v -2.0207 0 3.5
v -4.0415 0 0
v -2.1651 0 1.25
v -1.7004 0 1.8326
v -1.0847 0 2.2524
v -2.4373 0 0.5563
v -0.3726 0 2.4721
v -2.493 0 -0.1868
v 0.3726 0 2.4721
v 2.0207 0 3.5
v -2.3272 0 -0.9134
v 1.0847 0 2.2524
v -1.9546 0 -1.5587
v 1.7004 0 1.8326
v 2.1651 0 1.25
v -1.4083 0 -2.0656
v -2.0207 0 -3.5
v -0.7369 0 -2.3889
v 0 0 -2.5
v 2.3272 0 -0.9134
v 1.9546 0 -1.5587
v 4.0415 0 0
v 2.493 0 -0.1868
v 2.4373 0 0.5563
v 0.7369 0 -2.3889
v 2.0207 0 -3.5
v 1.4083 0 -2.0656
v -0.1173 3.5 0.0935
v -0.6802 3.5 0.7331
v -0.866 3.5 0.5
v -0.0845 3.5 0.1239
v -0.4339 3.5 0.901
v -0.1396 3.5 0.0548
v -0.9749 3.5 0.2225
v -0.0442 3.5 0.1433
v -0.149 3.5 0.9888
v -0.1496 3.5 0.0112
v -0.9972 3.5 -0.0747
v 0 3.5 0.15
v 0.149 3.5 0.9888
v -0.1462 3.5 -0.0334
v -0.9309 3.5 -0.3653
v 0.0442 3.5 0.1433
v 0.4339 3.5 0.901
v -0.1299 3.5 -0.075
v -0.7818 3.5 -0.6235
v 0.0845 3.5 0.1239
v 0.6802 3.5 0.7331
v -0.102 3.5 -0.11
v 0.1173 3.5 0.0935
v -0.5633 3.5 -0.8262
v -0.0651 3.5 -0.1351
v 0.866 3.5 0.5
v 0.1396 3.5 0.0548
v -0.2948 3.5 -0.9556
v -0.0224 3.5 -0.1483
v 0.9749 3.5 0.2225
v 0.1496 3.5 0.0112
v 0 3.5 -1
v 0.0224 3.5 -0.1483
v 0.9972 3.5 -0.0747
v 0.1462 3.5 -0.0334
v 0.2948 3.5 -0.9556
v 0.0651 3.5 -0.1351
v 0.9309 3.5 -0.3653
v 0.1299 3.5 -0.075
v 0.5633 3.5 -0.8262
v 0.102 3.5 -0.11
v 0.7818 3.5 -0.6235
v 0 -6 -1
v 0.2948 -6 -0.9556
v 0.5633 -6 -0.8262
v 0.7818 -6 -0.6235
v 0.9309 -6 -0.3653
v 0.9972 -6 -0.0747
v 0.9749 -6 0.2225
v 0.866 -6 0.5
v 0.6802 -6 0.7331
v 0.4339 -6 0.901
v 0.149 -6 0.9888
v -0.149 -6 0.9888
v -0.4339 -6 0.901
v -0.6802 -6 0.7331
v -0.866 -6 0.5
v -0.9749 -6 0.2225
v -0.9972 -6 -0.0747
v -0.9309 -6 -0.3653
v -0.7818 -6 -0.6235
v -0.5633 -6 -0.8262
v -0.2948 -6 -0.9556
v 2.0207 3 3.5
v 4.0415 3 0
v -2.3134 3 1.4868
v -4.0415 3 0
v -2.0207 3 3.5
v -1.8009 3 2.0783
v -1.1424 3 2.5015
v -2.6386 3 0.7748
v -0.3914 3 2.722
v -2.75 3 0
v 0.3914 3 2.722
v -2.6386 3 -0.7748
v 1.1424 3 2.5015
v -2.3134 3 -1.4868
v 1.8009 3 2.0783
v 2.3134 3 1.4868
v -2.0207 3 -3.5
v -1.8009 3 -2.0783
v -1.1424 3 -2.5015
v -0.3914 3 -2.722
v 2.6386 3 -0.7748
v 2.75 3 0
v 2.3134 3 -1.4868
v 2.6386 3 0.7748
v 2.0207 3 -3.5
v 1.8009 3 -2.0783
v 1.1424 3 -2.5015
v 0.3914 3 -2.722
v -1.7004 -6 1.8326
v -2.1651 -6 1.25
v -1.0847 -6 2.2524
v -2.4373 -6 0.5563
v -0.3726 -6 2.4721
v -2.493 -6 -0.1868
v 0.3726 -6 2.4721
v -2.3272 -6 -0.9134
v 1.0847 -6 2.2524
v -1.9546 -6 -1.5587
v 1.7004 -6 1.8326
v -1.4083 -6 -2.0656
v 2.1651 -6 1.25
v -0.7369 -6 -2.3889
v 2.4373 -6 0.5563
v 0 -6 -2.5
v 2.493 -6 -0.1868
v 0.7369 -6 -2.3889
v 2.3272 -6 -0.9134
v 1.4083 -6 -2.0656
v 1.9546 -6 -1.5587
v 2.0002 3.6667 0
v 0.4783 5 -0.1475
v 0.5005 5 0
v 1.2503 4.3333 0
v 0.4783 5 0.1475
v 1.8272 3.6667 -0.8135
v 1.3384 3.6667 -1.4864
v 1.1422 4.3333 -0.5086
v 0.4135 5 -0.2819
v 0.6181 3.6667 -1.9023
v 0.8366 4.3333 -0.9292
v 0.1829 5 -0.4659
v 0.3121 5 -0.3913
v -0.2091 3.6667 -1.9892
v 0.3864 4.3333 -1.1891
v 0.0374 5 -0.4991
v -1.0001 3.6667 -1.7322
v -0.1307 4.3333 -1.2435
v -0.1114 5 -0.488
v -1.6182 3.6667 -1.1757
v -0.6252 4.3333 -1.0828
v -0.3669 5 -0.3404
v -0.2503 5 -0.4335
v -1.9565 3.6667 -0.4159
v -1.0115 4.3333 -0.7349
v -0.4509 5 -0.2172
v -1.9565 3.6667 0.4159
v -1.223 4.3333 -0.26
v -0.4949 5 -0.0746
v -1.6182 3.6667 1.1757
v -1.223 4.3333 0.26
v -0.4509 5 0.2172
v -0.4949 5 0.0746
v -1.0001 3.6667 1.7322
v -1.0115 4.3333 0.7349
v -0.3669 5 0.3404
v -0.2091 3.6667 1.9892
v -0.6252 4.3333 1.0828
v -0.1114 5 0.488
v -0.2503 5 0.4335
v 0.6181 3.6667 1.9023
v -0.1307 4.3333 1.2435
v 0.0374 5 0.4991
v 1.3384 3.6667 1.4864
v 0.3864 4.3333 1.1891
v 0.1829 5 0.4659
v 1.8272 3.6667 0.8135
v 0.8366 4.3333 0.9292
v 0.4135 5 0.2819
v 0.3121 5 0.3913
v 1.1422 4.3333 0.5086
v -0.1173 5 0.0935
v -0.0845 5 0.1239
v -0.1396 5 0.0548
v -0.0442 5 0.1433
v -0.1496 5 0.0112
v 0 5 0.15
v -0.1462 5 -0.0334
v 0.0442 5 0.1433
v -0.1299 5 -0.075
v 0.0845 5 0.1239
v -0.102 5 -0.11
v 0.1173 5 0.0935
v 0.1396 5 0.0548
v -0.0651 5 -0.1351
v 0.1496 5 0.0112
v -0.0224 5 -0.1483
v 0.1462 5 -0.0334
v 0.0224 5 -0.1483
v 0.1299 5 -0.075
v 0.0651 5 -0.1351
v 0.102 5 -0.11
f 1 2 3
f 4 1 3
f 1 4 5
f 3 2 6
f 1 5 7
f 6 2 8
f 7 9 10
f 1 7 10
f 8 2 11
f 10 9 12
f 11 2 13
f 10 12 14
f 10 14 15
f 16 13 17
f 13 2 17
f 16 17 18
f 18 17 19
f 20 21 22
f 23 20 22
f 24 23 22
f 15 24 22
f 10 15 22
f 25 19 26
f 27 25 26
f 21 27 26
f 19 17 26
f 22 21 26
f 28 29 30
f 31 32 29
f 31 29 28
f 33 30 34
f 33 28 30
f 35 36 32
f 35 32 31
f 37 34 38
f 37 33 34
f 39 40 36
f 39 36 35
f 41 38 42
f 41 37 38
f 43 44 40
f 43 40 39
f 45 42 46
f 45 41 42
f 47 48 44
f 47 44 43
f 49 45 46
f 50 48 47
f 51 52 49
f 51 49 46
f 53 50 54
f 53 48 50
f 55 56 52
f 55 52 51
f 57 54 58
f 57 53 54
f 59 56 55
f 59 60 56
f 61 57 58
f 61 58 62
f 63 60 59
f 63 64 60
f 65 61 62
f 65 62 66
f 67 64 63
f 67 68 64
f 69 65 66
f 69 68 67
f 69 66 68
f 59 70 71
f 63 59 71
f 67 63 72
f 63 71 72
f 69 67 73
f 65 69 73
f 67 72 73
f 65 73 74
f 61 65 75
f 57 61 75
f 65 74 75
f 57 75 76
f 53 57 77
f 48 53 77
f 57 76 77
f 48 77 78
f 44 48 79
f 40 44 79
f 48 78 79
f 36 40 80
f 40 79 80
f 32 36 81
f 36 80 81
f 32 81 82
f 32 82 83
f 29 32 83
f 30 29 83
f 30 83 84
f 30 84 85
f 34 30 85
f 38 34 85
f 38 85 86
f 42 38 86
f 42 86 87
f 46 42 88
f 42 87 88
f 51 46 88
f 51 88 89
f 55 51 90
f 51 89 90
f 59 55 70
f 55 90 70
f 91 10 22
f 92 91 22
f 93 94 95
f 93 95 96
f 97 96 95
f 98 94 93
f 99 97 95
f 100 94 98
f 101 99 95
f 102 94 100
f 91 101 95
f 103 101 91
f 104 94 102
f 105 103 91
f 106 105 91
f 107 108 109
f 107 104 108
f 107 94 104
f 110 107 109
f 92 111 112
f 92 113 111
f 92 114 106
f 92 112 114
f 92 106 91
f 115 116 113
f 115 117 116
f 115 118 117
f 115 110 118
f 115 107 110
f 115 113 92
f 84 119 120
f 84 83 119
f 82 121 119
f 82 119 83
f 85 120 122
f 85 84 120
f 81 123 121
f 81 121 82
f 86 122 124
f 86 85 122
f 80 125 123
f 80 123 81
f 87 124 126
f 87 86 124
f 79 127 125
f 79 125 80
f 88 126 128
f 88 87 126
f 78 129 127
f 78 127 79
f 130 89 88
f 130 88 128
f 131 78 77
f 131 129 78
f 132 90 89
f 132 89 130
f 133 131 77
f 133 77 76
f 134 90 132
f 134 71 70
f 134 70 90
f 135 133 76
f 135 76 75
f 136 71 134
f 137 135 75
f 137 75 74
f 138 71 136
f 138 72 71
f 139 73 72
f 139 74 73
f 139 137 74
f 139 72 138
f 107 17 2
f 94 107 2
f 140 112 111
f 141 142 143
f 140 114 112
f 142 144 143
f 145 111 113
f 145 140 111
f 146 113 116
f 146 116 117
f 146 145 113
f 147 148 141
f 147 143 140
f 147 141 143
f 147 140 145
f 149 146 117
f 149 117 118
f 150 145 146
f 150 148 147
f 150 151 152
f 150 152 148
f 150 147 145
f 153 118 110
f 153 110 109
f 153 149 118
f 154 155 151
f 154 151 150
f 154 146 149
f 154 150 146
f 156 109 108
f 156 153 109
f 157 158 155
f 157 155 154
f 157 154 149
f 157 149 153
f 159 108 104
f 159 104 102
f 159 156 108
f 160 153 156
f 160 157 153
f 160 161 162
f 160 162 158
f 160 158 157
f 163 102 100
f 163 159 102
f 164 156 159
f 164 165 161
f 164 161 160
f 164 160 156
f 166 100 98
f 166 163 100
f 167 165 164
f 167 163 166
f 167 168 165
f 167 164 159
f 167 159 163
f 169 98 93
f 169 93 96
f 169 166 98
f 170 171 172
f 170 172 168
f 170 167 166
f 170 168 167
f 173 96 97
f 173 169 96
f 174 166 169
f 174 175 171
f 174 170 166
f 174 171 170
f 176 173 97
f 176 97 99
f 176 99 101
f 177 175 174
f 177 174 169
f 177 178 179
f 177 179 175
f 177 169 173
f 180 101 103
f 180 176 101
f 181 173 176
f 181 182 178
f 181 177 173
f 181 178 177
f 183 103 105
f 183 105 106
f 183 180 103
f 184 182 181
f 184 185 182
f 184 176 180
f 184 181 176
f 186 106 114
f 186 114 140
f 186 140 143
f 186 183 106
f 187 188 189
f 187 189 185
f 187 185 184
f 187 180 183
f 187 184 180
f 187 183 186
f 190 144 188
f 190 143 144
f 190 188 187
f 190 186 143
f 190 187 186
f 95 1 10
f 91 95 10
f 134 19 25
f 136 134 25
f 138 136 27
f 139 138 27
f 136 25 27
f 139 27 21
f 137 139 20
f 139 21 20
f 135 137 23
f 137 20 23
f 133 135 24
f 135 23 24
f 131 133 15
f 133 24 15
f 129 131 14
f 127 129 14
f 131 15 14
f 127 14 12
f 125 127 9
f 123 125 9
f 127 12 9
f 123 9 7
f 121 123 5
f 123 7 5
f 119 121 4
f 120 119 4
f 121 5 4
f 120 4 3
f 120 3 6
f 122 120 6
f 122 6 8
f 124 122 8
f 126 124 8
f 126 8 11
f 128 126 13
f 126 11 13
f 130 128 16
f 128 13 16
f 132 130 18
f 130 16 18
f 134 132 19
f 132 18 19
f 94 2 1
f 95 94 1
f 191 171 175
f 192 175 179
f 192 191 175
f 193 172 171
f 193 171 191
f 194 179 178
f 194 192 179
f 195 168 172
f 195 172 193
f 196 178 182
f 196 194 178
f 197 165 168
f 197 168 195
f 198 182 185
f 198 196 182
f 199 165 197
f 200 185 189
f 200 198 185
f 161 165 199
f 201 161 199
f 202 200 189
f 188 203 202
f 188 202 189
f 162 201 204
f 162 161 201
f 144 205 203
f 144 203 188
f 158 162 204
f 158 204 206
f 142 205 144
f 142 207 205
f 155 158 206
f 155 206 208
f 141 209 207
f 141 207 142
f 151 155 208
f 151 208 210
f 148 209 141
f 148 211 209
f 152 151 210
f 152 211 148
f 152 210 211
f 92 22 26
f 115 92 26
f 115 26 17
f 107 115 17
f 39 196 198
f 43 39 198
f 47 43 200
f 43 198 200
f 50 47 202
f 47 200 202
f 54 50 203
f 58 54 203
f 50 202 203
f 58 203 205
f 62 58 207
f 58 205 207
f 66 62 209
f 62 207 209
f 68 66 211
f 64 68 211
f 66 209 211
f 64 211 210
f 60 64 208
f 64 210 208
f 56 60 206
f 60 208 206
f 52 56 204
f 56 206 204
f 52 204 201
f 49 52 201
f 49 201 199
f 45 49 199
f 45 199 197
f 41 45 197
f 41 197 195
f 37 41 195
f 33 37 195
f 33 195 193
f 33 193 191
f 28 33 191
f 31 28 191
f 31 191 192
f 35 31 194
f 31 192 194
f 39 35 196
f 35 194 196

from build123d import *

# Parameters (mm, degrees)
BOSS_EXTRUDE1_DEPTH = 3
SKETCH2_R           = 2.75
BOSS_EXTRUDE2_DEPTH = 2
BOSS_EXTRUDE2_TAPER = 48.36
SKETCH4_R           = 0.15
CUT_EXTRUDE1_DEPTH  = 1.5
SKETCH6_R           = 2.5
BOSS_EXTRUDE3_DEPTH = 6
SKETCH7_R           = 1
CUT_EXTRUDE3_DEPTH  = 9.5


with BuildPart() as part:
    # Sketch1 → Boss-Extrude1 (new body)
    with BuildSketch(Plane(origin=(0, 0, 0), x_dir=(1, 0, 0), z_dir=(0, 1, 0))):
        Polygon((4.041451884, 0), (2.020725942, 3.5), (-2.020725942, 3.5), (-4.041451884, 0), (-2.020725942, -3.5), (2.020725942, -3.5), align=None)
    extrude(amount=BOSS_EXTRUDE1_DEPTH)

    # Sketch2 → Boss-Extrude2 (add)
    with BuildSketch(Plane(origin=(0, 3, 0), x_dir=(1, 0, 0), z_dir=(0, 1, 0))):
        Circle(SKETCH2_R)
    extrude(amount=BOSS_EXTRUDE2_DEPTH, taper=BOSS_EXTRUDE2_TAPER)

    # Sketch4 → Cut-Extrude1 (cut)
    with BuildSketch(Plane(origin=(0, 5, 0), x_dir=(1, 0, 0), z_dir=(0, 1, 0))):
        with Locations(Location((0, 0, 0), (0, 0, 270))):
            Circle(SKETCH4_R)
    extrude(amount=-CUT_EXTRUDE1_DEPTH, mode=Mode.SUBTRACT)

    # Sketch6 → Boss-Extrude3 (add)
    with BuildSketch(Plane.XZ):
        with Locations(Location((0, 0, 0), (0, 0, 270))):
            Circle(SKETCH6_R)
    extrude(amount=BOSS_EXTRUDE3_DEPTH)

    # Sketch7 → Cut-Extrude3 (cut)
    with BuildSketch(Plane.XZ.offset(6)):
        with Locations(Location((0, 0, 0), (0, 0, 270))):
            Circle(SKETCH7_R)
    extrude(amount=-CUT_EXTRUDE3_DEPTH, mode=Mode.SUBTRACT)


solid = part.part
